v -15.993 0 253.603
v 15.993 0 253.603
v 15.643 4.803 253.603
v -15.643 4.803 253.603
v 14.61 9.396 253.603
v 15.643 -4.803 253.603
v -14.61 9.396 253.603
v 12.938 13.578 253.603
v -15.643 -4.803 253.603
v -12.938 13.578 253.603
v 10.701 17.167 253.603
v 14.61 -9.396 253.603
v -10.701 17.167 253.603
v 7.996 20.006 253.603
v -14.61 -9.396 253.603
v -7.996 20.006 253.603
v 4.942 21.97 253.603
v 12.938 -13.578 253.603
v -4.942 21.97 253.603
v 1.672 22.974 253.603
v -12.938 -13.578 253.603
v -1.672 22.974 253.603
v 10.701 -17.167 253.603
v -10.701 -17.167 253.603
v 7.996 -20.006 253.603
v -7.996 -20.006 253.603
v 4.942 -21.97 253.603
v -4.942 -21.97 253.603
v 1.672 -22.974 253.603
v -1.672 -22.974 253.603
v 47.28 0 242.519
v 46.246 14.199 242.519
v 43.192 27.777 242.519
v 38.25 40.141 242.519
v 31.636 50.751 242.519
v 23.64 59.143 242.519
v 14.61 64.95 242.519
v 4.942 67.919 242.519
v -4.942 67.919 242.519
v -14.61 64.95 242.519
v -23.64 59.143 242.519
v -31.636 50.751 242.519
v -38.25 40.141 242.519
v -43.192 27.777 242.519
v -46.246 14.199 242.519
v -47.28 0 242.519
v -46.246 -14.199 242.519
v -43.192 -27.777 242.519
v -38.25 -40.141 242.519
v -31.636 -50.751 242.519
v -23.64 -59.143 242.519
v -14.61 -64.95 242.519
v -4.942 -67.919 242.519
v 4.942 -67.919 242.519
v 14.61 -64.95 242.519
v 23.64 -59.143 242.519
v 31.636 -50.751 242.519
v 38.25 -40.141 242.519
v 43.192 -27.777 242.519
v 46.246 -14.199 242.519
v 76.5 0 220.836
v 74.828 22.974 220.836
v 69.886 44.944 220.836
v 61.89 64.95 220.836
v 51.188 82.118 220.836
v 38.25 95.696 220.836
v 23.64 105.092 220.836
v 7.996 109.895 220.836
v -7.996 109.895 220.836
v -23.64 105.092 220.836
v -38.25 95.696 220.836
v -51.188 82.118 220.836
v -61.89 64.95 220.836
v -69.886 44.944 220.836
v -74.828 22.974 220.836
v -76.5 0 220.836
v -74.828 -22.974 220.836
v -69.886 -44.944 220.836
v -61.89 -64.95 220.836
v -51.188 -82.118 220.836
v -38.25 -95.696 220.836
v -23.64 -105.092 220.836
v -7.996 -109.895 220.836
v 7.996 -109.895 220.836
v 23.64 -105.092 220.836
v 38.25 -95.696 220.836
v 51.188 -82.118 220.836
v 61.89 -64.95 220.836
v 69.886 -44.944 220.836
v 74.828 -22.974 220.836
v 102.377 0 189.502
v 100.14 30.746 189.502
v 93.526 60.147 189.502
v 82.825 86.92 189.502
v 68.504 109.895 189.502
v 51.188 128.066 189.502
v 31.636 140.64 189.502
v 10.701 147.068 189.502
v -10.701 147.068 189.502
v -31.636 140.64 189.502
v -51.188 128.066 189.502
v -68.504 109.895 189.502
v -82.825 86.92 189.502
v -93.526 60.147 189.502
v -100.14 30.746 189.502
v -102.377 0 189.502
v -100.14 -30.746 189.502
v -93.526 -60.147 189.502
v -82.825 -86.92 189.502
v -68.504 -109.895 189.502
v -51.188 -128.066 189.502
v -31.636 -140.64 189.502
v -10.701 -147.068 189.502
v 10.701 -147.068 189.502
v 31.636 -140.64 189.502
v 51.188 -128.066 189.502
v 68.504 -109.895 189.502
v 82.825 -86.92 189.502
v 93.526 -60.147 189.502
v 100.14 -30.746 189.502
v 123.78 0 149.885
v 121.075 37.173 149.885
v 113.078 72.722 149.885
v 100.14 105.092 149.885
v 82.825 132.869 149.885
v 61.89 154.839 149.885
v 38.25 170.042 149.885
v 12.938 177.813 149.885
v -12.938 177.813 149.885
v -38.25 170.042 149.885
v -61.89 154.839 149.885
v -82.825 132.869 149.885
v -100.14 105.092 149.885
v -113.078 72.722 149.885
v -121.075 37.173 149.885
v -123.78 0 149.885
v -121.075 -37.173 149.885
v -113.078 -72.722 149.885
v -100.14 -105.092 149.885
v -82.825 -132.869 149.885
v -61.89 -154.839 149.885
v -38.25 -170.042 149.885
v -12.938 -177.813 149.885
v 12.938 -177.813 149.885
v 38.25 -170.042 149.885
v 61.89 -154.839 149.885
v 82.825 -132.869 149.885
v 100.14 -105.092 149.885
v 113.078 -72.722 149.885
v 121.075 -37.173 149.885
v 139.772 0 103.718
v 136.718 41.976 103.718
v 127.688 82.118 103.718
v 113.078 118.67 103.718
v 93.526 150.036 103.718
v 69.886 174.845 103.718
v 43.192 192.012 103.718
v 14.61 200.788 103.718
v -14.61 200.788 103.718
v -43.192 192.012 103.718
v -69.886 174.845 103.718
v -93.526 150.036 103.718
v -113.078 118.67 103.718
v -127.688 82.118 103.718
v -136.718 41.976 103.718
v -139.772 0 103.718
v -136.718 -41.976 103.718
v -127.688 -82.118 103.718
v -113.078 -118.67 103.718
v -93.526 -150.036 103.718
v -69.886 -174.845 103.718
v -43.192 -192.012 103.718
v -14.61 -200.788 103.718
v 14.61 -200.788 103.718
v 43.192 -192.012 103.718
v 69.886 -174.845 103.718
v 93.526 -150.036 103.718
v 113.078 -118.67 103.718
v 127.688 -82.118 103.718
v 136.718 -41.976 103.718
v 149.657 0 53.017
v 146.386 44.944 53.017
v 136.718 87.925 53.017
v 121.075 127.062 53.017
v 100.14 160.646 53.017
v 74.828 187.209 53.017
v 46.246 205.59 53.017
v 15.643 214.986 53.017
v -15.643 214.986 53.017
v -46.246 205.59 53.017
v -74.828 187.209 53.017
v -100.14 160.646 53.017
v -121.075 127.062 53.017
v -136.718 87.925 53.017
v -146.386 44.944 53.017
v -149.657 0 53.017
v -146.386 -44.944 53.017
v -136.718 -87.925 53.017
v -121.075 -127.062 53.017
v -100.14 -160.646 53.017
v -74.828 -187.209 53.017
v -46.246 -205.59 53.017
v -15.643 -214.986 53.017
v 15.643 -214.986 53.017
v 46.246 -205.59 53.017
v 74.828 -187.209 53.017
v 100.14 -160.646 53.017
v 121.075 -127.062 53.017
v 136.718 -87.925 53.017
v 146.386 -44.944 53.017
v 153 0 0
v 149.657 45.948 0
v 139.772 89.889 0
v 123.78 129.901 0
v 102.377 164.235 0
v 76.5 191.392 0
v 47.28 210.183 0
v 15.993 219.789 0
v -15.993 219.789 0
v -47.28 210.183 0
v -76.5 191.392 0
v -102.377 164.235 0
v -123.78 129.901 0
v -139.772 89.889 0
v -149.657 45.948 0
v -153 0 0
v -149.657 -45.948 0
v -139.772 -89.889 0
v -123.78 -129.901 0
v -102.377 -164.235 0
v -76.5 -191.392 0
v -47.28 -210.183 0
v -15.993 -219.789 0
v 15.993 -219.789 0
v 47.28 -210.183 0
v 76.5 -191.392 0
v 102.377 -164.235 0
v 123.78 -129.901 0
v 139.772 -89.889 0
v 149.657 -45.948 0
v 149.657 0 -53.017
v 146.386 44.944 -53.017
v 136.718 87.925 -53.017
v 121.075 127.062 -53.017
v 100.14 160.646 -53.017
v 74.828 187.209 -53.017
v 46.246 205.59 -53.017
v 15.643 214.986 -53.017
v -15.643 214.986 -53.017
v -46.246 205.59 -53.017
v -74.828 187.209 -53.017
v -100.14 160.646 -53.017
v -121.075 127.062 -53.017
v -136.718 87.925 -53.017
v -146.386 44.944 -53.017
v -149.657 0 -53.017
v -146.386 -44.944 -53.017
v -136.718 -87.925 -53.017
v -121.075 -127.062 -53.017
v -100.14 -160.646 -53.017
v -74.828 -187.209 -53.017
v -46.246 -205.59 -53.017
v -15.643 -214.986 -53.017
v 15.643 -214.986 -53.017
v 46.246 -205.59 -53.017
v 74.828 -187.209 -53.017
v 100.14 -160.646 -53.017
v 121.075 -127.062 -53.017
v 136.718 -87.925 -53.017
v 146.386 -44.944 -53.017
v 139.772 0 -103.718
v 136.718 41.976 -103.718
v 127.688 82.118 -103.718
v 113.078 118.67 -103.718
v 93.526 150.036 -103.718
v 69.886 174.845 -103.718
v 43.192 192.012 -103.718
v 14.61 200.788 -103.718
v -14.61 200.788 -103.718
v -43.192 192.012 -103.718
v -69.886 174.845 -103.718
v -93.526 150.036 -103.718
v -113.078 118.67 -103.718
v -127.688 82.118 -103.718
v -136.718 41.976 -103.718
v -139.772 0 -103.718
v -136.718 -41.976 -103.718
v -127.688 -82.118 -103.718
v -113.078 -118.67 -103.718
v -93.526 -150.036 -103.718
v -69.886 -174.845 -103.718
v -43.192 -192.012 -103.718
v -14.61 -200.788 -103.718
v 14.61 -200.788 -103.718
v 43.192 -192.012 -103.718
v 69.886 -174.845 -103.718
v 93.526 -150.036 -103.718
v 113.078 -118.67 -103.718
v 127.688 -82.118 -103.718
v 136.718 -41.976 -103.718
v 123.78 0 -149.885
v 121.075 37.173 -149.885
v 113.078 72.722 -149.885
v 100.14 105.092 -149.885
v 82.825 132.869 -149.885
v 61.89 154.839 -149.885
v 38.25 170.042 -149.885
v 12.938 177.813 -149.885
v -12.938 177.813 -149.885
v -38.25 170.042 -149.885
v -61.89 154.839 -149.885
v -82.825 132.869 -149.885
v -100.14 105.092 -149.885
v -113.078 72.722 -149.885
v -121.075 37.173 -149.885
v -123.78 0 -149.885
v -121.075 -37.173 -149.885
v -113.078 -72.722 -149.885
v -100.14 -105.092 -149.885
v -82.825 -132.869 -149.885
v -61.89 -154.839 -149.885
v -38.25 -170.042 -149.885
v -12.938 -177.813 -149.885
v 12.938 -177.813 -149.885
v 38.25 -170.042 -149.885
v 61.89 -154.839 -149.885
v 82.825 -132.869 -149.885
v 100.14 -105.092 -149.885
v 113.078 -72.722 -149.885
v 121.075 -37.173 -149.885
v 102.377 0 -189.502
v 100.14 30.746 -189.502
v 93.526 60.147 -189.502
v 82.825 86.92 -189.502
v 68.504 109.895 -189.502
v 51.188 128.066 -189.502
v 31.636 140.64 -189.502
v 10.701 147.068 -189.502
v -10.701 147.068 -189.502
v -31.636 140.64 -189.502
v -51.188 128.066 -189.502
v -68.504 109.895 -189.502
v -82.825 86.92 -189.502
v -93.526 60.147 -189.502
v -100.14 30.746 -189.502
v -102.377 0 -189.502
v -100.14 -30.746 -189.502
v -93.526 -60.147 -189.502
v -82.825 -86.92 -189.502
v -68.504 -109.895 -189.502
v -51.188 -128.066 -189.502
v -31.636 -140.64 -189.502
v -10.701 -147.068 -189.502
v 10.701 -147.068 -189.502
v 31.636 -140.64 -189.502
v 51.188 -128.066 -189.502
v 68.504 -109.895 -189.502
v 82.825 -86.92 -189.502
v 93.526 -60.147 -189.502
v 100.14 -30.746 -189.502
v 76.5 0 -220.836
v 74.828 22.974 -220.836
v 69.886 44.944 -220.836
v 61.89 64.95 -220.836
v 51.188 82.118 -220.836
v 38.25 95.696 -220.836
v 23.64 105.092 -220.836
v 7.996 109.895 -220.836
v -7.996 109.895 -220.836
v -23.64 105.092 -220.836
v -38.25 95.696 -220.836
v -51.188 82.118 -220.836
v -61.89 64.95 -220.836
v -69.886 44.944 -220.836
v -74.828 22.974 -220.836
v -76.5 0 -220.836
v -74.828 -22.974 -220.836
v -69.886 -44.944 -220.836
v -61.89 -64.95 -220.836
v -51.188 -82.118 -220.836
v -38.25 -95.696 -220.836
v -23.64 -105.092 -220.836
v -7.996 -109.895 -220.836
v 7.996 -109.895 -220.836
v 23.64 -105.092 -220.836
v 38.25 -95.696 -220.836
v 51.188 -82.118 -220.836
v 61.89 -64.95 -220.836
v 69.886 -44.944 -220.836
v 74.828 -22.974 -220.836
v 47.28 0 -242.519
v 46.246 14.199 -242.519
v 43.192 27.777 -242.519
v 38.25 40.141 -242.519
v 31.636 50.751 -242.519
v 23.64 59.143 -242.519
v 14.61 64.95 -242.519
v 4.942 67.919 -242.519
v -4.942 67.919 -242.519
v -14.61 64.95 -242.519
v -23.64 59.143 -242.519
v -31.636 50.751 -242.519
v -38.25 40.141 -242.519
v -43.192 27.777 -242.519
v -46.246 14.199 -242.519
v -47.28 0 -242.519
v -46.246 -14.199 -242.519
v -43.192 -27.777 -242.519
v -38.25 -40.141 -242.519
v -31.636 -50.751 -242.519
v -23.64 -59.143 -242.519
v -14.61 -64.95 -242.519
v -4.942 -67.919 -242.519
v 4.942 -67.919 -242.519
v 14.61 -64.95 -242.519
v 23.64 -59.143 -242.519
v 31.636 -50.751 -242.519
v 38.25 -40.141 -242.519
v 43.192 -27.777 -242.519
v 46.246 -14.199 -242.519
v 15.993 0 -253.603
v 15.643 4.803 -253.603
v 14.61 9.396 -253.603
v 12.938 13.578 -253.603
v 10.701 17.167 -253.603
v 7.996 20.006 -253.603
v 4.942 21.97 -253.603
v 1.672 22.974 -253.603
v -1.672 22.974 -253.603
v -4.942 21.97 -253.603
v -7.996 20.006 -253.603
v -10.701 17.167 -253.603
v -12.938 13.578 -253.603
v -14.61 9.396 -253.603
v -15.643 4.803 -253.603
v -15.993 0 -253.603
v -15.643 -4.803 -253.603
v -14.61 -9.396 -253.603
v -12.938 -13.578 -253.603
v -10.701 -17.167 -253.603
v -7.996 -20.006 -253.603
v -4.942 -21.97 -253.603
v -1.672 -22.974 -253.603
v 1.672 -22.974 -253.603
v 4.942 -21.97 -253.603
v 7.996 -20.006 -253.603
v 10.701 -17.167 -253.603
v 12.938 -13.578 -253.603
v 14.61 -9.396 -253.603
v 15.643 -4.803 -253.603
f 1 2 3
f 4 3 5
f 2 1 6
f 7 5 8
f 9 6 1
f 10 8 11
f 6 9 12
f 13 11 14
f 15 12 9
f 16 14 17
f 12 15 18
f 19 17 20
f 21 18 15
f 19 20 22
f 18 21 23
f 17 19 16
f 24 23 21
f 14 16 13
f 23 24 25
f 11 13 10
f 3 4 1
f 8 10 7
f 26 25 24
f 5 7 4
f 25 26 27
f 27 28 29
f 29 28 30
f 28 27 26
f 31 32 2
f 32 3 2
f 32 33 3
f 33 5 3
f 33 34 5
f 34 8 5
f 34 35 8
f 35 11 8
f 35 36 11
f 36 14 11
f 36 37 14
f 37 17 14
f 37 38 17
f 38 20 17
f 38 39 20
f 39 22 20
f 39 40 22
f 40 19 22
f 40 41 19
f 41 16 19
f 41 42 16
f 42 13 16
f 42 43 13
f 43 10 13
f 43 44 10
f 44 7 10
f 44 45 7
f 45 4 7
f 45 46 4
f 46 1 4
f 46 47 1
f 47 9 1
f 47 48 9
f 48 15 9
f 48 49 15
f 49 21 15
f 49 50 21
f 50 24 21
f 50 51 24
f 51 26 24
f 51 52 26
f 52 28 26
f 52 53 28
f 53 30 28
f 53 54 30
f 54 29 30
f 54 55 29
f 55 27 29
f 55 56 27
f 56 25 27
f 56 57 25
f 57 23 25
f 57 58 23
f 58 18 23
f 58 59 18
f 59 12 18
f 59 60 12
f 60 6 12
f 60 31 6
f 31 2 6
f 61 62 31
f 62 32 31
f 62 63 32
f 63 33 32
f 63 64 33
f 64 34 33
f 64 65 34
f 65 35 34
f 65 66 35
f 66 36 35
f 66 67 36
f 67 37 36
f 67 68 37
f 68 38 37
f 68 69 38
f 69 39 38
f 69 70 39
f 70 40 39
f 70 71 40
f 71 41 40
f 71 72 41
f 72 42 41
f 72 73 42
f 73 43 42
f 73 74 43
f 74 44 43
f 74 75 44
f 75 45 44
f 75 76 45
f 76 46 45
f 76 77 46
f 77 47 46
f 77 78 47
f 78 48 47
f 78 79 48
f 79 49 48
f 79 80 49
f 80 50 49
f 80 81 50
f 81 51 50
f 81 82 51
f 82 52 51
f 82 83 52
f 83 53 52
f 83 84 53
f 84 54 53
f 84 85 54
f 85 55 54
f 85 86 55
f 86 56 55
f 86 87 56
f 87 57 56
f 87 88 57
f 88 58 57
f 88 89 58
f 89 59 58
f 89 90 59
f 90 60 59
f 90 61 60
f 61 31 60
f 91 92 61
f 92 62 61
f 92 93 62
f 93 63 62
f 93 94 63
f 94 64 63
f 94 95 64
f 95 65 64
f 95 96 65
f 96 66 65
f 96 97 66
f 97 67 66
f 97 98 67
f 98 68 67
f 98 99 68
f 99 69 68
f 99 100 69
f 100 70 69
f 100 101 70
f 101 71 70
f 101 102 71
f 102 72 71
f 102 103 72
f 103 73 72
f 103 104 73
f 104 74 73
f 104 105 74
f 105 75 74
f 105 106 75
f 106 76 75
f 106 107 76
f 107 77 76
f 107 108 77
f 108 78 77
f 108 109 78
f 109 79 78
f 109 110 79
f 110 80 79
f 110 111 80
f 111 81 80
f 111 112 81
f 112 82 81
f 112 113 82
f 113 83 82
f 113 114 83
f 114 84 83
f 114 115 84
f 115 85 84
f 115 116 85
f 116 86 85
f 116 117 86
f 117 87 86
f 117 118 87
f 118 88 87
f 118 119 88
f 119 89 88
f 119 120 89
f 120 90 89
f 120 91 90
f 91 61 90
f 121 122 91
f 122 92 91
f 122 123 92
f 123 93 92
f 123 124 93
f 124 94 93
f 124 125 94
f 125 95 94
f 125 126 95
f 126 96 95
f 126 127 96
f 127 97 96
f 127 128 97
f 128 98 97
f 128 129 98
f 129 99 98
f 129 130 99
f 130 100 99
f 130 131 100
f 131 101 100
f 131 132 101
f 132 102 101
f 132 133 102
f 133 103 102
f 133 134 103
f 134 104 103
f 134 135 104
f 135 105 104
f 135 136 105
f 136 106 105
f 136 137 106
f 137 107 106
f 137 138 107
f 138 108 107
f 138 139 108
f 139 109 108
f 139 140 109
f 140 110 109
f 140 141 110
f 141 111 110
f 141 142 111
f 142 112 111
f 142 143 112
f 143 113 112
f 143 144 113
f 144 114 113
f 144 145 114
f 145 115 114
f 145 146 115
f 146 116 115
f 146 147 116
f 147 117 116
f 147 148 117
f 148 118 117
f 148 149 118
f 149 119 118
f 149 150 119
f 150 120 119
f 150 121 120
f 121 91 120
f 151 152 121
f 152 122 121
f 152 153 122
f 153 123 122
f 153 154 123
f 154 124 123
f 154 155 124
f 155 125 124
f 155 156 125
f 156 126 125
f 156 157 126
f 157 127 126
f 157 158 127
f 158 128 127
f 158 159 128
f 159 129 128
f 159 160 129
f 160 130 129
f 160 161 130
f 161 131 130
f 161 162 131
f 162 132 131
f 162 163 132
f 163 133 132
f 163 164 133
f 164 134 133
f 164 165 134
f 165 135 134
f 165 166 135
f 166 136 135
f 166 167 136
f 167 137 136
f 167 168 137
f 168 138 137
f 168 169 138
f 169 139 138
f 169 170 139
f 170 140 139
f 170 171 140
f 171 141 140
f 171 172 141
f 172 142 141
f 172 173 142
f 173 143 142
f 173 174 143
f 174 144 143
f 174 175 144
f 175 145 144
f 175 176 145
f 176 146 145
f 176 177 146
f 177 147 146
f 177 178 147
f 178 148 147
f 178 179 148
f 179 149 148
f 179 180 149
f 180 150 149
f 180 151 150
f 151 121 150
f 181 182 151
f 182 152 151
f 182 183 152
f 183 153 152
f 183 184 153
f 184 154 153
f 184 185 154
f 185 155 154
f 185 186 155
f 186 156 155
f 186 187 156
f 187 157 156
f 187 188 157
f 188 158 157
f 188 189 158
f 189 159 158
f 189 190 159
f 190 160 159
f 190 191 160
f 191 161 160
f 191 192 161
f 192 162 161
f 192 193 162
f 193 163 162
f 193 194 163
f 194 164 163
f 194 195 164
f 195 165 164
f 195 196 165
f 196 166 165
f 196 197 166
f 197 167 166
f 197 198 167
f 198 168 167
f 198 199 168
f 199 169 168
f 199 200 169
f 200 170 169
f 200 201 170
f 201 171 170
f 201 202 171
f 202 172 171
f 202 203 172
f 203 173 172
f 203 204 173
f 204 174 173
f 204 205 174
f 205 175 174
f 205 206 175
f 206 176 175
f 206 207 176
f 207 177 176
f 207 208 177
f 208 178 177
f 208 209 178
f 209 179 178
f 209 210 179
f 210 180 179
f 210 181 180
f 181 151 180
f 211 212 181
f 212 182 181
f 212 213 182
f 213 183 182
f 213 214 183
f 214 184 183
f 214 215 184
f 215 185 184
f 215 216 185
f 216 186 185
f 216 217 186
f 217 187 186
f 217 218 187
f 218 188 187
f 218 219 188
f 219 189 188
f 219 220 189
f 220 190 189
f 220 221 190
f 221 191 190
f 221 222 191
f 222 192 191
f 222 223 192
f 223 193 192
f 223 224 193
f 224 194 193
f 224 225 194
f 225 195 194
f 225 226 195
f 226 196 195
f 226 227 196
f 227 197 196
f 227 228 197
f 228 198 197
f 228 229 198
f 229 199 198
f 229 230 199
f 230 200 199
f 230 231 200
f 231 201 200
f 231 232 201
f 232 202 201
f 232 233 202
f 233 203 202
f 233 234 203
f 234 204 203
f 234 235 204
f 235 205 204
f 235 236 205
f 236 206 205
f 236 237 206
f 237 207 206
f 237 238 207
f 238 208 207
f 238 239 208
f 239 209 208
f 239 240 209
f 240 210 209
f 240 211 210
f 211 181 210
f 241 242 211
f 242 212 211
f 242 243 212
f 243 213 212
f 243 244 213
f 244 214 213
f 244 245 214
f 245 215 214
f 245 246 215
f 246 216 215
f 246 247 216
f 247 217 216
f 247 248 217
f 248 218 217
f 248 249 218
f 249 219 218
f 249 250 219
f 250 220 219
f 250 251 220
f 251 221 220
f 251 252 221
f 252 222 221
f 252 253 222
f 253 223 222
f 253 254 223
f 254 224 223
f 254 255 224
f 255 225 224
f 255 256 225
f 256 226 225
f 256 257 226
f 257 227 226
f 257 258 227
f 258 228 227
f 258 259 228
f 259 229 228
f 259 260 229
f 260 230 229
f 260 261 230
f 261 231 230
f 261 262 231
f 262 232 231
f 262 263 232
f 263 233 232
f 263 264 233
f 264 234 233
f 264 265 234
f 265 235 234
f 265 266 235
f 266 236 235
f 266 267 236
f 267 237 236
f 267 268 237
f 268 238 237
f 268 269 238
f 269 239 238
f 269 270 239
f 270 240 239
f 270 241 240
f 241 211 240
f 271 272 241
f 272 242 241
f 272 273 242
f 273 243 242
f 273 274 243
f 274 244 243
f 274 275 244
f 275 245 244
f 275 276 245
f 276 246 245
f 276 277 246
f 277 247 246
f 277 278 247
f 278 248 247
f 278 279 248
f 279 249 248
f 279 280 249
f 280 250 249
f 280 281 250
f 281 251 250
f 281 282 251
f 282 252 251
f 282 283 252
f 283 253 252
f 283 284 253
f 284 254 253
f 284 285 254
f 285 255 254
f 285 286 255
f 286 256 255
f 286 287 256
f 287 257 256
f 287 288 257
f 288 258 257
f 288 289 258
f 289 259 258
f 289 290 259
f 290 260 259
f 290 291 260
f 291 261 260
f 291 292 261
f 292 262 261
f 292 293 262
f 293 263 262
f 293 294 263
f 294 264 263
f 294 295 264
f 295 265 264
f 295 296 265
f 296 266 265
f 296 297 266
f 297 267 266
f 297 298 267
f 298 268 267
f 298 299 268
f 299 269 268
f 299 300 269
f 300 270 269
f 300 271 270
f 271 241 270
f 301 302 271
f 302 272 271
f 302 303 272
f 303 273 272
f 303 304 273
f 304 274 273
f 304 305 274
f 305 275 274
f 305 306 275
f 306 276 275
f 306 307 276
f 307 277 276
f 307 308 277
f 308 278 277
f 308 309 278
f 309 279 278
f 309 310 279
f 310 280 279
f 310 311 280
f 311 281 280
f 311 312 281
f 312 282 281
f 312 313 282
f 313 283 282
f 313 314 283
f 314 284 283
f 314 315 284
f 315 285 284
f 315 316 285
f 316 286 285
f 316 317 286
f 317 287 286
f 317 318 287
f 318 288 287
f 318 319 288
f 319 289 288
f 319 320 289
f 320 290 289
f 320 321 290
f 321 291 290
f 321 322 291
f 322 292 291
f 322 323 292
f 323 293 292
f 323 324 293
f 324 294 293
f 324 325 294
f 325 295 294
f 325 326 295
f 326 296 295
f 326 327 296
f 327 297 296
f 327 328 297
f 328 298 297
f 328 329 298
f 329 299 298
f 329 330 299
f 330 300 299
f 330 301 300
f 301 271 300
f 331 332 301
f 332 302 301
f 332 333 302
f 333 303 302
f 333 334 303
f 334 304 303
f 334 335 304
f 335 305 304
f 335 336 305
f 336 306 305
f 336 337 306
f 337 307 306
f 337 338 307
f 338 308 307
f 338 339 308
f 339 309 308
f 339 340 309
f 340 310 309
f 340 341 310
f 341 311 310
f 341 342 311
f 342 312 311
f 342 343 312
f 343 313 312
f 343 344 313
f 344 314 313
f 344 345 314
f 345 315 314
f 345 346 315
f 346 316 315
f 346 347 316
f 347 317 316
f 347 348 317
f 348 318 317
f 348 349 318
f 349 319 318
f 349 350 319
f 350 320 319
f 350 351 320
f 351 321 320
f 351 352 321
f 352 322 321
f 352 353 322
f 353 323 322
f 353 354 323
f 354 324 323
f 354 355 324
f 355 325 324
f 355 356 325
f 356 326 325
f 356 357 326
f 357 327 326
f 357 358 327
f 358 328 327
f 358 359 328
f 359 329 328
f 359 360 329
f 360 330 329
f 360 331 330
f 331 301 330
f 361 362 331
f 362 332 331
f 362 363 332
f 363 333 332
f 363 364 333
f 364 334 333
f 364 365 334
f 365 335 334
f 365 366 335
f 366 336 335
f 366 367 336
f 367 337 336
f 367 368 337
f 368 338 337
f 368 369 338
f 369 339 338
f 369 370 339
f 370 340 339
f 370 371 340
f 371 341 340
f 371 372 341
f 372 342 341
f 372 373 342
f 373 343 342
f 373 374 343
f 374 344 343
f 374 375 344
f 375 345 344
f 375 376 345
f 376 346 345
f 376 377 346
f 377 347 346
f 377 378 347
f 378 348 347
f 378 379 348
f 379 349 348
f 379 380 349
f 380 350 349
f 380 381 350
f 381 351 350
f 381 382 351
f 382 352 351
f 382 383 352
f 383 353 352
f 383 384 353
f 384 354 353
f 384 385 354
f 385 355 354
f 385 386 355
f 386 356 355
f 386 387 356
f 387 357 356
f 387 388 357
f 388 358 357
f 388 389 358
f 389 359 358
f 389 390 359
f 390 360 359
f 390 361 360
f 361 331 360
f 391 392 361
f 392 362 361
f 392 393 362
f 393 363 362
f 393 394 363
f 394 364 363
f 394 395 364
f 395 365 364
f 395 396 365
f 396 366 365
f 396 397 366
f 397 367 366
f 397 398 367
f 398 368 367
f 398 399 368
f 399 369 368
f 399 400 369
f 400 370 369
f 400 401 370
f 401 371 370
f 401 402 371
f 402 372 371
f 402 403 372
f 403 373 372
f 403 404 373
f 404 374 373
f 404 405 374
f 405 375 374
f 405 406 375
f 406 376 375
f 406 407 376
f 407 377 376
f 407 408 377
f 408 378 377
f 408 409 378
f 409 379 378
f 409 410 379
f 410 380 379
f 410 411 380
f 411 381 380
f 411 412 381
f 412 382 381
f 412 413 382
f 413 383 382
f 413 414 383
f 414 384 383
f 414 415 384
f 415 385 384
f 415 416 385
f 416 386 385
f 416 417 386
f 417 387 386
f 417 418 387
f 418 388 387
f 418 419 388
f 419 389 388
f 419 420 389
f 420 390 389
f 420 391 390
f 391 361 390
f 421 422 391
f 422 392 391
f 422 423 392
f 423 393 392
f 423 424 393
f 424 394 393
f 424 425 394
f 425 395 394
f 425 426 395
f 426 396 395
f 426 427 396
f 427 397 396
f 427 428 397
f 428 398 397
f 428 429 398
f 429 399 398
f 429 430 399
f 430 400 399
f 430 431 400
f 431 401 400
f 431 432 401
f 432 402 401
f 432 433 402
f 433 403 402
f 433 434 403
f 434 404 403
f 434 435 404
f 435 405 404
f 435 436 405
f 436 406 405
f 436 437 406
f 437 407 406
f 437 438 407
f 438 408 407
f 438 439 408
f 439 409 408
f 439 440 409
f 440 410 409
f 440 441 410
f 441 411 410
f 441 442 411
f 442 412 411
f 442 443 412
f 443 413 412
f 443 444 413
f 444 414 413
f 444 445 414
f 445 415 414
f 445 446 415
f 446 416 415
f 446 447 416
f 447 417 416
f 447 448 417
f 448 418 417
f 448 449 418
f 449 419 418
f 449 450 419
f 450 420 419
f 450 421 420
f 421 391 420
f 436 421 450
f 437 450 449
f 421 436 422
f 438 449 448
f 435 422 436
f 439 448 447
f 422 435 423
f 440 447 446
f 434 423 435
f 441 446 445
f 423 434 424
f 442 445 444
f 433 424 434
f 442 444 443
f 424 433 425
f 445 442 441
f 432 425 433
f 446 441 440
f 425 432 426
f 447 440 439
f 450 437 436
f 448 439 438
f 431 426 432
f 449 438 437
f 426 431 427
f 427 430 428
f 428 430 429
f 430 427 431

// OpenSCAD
// Generated by SolidPython 1.0.1 on 2020-07-29 00:46:49


scale(v = [9, 13, 15]) {
	sphere(r = 17);
}
/***********************************************
*********      SolidPython code:      **********
************************************************
 
# import packages: SolidPython
from solid import *
from solid.utils import *
from itertools import chain, combinations, permutations


class Resize:

    def __init__(self, scad_file):
        self.scad_file = scad_file
        #self.scad_file = import_scad(scad_file)
        # cone/cylinder param:
        self.r1 = 0
        self.r2 = 0
        self.h = 0
        # rectangular prism param:
        self.w = 0
        self.l = 0
        # ellipse param:
        self.r = 0

    # import OpenScad code (file name corresponds to shape)


    # classify shape + parameters
    def assign(self, param1, param2, param3):
        if self.scad_file == 'cone.scad':
            self.r1 = param1
            self.r2 = param2
            self.h = param3
        elif self.scad_file == 'cylinder.scad':
            self.r1 = param1
            self.r2 = param2
            self.h = param3
        elif self.scad_file == 'rectangularPrism.scad':
            self.h = param1
            self.l = param2
            self.w = param3
        else:
            self.r = param1
            self.h = param2

    # resize parameters
    def iterate(self):
        x = range(3, 20, 2)
        i = 1
        if self.scad_file == 'cone.scad':
            tempList = list(permutations(x, 2))
            for temp in tempList:
                param1 = temp[0]
                param2 = temp[1]
                filepath = 'produced_scad_files/' + 'cone' + str(param1) + '_' + str(param2) + '_' + '.scad'
                scad_render_to_file(cylinder(h=param1, r1=param2, r2=0), filepath)

        elif self.scad_file == 'cylinder.scad':
            tempList = list(permutations(x, 3))
            for temp in tempList:
                param1 = temp[0]
                param2 = temp[1]
                filepath = 'produced_scad_files/' + 'cylinder' + str(param1) + '_' + str(param2) + '_' + '.scad'
                scad_render_to_file(cylinder(h=param1, r1=param2, r2=param2), filepath)

        elif self.scad_file == 'rectangularPrism.scad':
            tempList = list(permutations(x, 3))
            for temp in tempList:
                param1 = temp[0]
                param2 = temp[1]
                param3 = temp[2]
                filepath = 'produced_scad_files/' + 'rectangularPrism' + str(param1) + '_' + str(param2) + '_' + str(
                    param3) + '.scad'
                scad_render_to_file(cube(size=(param1, param2, param3)), filepath)

        elif self.scad_file == 'ellipse.scad':
            tempList = list(permutations(x, 4))
            for temp in tempList:
                param1 = temp[0]
                param2 = temp[1]
                param3 = temp[2]
                param4 = temp[3]
                filepath = 'produced_scad_files/' + 'ellipse' + str(param1) + '_' + str(param2) + '_' + str(param3) + '_' + str(param4) + '.scad'
                scad_render_to_file(scale([param1, param2, param3])(sphere(r=param4)), filepath)

    def render_to_scadfile(self):
        scad_render_to_file(scad, 'example.scad') 
 
************************************************/
